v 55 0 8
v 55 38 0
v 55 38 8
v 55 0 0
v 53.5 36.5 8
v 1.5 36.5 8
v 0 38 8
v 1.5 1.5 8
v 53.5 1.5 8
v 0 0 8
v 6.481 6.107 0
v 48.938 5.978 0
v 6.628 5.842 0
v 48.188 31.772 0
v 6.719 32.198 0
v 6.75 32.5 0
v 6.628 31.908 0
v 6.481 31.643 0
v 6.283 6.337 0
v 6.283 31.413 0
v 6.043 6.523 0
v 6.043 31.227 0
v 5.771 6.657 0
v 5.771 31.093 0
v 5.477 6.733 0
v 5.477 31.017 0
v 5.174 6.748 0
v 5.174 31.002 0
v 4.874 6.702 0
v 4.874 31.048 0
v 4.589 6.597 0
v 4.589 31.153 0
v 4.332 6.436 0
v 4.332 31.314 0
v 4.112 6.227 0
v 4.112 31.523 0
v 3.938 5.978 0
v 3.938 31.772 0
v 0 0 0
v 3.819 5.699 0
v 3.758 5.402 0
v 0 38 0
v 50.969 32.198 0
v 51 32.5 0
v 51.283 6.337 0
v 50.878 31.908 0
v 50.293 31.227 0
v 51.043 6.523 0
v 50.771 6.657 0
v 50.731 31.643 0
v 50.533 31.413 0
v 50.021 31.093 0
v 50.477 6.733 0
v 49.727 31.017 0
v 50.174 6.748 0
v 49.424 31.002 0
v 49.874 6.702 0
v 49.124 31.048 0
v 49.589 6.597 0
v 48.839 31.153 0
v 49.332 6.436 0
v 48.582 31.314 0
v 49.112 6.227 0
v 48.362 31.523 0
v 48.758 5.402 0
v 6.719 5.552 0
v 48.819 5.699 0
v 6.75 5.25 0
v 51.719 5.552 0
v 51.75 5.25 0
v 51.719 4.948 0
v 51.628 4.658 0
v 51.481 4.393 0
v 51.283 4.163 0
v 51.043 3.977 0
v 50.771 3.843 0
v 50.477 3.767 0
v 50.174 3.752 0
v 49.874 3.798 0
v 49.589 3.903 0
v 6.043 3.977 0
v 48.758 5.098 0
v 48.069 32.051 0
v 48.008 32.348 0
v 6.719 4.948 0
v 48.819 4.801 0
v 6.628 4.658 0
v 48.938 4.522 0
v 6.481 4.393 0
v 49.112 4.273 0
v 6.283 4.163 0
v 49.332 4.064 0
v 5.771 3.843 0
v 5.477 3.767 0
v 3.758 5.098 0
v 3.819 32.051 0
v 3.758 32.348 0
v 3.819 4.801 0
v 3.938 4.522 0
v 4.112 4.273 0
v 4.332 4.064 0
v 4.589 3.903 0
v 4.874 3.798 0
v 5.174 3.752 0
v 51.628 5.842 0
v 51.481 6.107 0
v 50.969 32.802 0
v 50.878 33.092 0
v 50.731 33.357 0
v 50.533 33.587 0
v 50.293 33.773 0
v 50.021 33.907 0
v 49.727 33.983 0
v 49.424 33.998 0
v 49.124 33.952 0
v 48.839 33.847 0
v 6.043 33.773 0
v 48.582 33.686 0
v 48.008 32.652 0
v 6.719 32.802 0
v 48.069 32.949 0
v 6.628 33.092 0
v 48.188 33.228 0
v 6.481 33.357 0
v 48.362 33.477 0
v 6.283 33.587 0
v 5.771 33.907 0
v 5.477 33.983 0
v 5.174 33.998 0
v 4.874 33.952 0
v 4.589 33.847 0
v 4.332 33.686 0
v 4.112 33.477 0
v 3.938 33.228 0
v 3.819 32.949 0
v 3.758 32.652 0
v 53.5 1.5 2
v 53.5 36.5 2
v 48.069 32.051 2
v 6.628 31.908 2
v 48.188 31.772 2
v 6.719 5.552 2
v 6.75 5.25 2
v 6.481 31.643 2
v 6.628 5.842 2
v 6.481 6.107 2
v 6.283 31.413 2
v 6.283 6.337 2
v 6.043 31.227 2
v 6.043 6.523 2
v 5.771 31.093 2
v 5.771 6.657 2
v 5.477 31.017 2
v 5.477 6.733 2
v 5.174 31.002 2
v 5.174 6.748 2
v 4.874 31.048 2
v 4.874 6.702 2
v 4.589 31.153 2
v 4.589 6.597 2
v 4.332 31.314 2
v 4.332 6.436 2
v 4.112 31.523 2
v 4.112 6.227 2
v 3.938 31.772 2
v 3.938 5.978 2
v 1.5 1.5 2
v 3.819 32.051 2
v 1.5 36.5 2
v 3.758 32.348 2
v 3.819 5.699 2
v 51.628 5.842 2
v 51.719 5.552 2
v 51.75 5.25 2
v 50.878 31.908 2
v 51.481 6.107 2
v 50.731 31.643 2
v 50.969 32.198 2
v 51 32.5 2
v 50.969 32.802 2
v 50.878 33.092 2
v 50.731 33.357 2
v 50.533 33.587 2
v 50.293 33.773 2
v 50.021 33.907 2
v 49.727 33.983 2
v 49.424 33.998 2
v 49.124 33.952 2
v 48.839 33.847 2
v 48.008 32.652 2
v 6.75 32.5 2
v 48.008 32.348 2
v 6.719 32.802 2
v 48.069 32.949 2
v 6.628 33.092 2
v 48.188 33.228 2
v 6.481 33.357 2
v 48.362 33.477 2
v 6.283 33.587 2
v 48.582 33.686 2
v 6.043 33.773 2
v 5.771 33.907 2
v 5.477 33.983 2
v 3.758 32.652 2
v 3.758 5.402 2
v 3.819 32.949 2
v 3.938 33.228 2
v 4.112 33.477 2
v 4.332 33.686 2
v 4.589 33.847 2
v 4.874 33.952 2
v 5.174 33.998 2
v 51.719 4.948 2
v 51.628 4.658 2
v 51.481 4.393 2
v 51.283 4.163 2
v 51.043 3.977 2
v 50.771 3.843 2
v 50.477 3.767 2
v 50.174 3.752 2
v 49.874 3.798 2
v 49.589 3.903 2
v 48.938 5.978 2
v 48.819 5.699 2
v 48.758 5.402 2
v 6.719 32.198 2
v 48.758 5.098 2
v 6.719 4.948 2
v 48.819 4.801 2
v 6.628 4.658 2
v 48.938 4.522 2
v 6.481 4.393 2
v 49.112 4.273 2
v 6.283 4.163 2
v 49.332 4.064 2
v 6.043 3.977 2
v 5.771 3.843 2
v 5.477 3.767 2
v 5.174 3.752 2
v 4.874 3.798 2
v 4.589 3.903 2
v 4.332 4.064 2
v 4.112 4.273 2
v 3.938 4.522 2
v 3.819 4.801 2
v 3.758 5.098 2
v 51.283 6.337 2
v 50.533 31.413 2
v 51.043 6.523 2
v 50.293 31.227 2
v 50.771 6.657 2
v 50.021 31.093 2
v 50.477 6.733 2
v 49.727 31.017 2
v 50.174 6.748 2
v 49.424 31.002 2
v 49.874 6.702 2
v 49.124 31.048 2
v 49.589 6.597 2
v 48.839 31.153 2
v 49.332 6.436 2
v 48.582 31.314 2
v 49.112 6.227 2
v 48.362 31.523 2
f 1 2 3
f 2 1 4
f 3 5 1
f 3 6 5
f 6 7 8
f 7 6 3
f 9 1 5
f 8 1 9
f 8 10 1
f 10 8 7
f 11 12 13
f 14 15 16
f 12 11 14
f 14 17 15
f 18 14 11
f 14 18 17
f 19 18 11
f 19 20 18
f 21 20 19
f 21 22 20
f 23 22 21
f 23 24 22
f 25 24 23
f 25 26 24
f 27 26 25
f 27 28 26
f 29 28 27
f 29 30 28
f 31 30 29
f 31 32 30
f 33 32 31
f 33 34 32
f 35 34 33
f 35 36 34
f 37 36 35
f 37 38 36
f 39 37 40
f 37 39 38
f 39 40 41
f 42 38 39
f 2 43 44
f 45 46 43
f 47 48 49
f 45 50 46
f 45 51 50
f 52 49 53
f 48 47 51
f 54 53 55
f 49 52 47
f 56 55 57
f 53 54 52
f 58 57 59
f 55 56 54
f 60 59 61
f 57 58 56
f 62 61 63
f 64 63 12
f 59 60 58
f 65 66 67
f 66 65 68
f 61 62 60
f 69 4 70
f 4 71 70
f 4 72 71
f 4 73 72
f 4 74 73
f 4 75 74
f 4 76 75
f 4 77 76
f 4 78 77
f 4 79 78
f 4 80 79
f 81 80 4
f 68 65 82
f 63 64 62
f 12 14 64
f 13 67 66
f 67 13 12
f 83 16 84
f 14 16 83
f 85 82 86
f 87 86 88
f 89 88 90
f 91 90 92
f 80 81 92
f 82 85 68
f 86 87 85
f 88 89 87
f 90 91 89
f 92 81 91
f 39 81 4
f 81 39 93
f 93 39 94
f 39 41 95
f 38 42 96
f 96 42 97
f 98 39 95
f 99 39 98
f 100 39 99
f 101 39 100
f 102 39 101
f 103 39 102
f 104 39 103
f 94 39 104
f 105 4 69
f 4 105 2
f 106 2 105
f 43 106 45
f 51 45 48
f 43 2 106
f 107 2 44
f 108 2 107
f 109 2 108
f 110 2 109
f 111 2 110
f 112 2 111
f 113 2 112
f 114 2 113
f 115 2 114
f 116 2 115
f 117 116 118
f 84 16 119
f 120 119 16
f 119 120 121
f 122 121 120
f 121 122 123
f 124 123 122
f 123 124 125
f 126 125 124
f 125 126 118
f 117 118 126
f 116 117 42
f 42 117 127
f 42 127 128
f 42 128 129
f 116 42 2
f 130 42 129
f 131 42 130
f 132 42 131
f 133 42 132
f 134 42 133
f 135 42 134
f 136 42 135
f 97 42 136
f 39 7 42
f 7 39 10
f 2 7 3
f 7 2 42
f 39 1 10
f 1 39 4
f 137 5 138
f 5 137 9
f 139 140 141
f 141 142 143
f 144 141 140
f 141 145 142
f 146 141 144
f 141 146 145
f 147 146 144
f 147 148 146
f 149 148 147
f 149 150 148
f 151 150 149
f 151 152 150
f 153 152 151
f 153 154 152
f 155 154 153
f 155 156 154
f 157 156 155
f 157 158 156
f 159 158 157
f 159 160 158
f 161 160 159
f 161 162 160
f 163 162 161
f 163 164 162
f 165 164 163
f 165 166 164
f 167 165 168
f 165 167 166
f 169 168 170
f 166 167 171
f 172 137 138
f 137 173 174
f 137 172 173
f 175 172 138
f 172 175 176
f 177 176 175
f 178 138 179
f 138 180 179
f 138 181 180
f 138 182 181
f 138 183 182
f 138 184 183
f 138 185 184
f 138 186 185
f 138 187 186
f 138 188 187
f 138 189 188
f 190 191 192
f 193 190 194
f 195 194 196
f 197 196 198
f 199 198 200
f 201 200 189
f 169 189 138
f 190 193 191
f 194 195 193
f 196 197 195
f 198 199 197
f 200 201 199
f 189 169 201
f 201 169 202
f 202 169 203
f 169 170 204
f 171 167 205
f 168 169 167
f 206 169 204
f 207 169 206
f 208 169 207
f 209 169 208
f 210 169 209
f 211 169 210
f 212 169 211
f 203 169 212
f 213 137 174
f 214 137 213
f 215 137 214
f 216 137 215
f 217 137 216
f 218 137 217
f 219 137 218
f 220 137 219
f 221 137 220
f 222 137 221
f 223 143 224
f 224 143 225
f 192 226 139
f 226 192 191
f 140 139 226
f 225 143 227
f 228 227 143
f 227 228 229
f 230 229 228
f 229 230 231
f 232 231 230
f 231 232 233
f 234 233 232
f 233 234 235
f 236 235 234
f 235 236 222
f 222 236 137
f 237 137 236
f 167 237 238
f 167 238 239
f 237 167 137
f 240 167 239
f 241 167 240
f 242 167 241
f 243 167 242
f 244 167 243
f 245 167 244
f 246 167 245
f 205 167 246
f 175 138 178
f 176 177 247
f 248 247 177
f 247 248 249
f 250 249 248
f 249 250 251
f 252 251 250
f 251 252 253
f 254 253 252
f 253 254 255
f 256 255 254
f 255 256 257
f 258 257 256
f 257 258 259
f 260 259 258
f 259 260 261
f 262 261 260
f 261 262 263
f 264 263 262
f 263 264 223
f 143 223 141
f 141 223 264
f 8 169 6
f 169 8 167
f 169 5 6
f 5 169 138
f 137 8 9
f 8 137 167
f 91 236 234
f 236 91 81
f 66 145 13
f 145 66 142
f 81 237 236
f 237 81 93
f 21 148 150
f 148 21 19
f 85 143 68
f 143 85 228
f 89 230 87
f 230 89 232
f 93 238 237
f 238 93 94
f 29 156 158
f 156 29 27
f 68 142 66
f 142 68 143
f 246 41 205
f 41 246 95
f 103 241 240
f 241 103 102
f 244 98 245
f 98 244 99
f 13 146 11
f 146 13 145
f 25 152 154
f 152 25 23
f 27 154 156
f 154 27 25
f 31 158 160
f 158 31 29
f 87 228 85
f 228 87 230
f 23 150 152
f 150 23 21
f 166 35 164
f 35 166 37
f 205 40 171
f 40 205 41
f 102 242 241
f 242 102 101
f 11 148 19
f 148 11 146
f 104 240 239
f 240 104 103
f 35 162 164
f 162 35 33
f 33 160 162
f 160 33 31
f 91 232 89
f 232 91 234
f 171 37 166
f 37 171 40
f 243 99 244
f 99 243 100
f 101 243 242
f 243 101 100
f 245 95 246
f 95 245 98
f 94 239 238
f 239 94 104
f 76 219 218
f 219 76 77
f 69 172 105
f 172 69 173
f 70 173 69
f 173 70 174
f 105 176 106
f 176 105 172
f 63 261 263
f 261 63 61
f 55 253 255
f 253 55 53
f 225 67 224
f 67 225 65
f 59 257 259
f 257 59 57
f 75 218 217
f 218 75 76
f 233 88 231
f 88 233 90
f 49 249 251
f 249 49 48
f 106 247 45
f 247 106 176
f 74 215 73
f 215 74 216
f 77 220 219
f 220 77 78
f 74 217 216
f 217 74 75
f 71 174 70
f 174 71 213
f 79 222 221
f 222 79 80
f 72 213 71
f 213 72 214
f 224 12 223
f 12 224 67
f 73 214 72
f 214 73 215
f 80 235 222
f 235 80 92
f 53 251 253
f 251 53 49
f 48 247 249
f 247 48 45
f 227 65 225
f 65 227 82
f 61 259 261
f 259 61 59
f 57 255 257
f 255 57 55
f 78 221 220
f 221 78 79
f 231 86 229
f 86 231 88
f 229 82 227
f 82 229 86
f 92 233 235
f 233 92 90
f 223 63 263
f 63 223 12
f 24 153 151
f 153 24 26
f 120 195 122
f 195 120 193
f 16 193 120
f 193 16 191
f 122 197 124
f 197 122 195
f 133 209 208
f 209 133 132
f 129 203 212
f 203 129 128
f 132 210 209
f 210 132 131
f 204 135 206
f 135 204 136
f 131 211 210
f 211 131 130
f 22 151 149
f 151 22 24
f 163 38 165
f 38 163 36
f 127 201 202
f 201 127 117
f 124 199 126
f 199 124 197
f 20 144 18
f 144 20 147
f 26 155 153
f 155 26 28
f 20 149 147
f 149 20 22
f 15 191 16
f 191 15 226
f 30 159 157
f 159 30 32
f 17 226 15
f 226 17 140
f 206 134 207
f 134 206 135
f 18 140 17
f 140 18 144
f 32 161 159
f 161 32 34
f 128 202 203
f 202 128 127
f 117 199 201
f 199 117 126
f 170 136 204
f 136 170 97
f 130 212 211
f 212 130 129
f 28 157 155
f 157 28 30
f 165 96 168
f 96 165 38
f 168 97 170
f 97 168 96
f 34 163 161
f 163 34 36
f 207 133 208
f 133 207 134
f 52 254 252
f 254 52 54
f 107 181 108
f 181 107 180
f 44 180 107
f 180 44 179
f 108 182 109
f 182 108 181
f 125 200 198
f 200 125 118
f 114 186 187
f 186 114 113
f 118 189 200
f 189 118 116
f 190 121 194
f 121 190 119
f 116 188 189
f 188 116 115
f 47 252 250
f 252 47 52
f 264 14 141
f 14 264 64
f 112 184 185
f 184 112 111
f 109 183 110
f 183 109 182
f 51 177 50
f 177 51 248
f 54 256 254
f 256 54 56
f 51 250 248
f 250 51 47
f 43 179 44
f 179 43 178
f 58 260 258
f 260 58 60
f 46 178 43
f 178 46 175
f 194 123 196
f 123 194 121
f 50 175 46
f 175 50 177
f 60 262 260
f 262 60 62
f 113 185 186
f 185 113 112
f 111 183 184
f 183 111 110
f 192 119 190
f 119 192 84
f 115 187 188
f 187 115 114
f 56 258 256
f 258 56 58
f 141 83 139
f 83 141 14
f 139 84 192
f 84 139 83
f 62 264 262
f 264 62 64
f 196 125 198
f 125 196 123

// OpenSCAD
// Boks til M-Bus-adapter

debug = true;
idiot = $preview ? .5 : 0;
fn = $preview ? 12 : 31;
board_x = 48;
board_y = 31;
height = debug ? 6 : 22;
walls = 1.5;
gap = 2;
bottom = 2;
hole_r = 1.5;

difference() {
    cube([board_x+walls*2+gap*2,board_y+walls*2+gap*2,height+bottom]);
    translate([walls,walls,bottom]) {
        cube([board_x+gap*2,board_y+gap*2,height+idiot]);
    }
    translate([(walls+walls/2+3), walls+walls/2+3,-idiot], $fn=fn) {
        cylinder(r=hole_r,h=bottom+idiot*2);
    }
    translate([board_x-(walls-walls/2-3),(walls+walls/2+3),-idiot], $fn=fn) {
        cylinder(r=hole_r,h=bottom+idiot*2);
    }
    translate([(walls+walls/2+3),board_y-(walls-3),-idiot], $fn=fn) {
        cylinder(r=hole_r,h=bottom+idiot*2);
    }
    translate([board_x-walls+3,board_y-(walls-3),-idiot], $fn=fn) {
        cylinder(r=hole_r,h=bottom+idiot*2);
    }
}
